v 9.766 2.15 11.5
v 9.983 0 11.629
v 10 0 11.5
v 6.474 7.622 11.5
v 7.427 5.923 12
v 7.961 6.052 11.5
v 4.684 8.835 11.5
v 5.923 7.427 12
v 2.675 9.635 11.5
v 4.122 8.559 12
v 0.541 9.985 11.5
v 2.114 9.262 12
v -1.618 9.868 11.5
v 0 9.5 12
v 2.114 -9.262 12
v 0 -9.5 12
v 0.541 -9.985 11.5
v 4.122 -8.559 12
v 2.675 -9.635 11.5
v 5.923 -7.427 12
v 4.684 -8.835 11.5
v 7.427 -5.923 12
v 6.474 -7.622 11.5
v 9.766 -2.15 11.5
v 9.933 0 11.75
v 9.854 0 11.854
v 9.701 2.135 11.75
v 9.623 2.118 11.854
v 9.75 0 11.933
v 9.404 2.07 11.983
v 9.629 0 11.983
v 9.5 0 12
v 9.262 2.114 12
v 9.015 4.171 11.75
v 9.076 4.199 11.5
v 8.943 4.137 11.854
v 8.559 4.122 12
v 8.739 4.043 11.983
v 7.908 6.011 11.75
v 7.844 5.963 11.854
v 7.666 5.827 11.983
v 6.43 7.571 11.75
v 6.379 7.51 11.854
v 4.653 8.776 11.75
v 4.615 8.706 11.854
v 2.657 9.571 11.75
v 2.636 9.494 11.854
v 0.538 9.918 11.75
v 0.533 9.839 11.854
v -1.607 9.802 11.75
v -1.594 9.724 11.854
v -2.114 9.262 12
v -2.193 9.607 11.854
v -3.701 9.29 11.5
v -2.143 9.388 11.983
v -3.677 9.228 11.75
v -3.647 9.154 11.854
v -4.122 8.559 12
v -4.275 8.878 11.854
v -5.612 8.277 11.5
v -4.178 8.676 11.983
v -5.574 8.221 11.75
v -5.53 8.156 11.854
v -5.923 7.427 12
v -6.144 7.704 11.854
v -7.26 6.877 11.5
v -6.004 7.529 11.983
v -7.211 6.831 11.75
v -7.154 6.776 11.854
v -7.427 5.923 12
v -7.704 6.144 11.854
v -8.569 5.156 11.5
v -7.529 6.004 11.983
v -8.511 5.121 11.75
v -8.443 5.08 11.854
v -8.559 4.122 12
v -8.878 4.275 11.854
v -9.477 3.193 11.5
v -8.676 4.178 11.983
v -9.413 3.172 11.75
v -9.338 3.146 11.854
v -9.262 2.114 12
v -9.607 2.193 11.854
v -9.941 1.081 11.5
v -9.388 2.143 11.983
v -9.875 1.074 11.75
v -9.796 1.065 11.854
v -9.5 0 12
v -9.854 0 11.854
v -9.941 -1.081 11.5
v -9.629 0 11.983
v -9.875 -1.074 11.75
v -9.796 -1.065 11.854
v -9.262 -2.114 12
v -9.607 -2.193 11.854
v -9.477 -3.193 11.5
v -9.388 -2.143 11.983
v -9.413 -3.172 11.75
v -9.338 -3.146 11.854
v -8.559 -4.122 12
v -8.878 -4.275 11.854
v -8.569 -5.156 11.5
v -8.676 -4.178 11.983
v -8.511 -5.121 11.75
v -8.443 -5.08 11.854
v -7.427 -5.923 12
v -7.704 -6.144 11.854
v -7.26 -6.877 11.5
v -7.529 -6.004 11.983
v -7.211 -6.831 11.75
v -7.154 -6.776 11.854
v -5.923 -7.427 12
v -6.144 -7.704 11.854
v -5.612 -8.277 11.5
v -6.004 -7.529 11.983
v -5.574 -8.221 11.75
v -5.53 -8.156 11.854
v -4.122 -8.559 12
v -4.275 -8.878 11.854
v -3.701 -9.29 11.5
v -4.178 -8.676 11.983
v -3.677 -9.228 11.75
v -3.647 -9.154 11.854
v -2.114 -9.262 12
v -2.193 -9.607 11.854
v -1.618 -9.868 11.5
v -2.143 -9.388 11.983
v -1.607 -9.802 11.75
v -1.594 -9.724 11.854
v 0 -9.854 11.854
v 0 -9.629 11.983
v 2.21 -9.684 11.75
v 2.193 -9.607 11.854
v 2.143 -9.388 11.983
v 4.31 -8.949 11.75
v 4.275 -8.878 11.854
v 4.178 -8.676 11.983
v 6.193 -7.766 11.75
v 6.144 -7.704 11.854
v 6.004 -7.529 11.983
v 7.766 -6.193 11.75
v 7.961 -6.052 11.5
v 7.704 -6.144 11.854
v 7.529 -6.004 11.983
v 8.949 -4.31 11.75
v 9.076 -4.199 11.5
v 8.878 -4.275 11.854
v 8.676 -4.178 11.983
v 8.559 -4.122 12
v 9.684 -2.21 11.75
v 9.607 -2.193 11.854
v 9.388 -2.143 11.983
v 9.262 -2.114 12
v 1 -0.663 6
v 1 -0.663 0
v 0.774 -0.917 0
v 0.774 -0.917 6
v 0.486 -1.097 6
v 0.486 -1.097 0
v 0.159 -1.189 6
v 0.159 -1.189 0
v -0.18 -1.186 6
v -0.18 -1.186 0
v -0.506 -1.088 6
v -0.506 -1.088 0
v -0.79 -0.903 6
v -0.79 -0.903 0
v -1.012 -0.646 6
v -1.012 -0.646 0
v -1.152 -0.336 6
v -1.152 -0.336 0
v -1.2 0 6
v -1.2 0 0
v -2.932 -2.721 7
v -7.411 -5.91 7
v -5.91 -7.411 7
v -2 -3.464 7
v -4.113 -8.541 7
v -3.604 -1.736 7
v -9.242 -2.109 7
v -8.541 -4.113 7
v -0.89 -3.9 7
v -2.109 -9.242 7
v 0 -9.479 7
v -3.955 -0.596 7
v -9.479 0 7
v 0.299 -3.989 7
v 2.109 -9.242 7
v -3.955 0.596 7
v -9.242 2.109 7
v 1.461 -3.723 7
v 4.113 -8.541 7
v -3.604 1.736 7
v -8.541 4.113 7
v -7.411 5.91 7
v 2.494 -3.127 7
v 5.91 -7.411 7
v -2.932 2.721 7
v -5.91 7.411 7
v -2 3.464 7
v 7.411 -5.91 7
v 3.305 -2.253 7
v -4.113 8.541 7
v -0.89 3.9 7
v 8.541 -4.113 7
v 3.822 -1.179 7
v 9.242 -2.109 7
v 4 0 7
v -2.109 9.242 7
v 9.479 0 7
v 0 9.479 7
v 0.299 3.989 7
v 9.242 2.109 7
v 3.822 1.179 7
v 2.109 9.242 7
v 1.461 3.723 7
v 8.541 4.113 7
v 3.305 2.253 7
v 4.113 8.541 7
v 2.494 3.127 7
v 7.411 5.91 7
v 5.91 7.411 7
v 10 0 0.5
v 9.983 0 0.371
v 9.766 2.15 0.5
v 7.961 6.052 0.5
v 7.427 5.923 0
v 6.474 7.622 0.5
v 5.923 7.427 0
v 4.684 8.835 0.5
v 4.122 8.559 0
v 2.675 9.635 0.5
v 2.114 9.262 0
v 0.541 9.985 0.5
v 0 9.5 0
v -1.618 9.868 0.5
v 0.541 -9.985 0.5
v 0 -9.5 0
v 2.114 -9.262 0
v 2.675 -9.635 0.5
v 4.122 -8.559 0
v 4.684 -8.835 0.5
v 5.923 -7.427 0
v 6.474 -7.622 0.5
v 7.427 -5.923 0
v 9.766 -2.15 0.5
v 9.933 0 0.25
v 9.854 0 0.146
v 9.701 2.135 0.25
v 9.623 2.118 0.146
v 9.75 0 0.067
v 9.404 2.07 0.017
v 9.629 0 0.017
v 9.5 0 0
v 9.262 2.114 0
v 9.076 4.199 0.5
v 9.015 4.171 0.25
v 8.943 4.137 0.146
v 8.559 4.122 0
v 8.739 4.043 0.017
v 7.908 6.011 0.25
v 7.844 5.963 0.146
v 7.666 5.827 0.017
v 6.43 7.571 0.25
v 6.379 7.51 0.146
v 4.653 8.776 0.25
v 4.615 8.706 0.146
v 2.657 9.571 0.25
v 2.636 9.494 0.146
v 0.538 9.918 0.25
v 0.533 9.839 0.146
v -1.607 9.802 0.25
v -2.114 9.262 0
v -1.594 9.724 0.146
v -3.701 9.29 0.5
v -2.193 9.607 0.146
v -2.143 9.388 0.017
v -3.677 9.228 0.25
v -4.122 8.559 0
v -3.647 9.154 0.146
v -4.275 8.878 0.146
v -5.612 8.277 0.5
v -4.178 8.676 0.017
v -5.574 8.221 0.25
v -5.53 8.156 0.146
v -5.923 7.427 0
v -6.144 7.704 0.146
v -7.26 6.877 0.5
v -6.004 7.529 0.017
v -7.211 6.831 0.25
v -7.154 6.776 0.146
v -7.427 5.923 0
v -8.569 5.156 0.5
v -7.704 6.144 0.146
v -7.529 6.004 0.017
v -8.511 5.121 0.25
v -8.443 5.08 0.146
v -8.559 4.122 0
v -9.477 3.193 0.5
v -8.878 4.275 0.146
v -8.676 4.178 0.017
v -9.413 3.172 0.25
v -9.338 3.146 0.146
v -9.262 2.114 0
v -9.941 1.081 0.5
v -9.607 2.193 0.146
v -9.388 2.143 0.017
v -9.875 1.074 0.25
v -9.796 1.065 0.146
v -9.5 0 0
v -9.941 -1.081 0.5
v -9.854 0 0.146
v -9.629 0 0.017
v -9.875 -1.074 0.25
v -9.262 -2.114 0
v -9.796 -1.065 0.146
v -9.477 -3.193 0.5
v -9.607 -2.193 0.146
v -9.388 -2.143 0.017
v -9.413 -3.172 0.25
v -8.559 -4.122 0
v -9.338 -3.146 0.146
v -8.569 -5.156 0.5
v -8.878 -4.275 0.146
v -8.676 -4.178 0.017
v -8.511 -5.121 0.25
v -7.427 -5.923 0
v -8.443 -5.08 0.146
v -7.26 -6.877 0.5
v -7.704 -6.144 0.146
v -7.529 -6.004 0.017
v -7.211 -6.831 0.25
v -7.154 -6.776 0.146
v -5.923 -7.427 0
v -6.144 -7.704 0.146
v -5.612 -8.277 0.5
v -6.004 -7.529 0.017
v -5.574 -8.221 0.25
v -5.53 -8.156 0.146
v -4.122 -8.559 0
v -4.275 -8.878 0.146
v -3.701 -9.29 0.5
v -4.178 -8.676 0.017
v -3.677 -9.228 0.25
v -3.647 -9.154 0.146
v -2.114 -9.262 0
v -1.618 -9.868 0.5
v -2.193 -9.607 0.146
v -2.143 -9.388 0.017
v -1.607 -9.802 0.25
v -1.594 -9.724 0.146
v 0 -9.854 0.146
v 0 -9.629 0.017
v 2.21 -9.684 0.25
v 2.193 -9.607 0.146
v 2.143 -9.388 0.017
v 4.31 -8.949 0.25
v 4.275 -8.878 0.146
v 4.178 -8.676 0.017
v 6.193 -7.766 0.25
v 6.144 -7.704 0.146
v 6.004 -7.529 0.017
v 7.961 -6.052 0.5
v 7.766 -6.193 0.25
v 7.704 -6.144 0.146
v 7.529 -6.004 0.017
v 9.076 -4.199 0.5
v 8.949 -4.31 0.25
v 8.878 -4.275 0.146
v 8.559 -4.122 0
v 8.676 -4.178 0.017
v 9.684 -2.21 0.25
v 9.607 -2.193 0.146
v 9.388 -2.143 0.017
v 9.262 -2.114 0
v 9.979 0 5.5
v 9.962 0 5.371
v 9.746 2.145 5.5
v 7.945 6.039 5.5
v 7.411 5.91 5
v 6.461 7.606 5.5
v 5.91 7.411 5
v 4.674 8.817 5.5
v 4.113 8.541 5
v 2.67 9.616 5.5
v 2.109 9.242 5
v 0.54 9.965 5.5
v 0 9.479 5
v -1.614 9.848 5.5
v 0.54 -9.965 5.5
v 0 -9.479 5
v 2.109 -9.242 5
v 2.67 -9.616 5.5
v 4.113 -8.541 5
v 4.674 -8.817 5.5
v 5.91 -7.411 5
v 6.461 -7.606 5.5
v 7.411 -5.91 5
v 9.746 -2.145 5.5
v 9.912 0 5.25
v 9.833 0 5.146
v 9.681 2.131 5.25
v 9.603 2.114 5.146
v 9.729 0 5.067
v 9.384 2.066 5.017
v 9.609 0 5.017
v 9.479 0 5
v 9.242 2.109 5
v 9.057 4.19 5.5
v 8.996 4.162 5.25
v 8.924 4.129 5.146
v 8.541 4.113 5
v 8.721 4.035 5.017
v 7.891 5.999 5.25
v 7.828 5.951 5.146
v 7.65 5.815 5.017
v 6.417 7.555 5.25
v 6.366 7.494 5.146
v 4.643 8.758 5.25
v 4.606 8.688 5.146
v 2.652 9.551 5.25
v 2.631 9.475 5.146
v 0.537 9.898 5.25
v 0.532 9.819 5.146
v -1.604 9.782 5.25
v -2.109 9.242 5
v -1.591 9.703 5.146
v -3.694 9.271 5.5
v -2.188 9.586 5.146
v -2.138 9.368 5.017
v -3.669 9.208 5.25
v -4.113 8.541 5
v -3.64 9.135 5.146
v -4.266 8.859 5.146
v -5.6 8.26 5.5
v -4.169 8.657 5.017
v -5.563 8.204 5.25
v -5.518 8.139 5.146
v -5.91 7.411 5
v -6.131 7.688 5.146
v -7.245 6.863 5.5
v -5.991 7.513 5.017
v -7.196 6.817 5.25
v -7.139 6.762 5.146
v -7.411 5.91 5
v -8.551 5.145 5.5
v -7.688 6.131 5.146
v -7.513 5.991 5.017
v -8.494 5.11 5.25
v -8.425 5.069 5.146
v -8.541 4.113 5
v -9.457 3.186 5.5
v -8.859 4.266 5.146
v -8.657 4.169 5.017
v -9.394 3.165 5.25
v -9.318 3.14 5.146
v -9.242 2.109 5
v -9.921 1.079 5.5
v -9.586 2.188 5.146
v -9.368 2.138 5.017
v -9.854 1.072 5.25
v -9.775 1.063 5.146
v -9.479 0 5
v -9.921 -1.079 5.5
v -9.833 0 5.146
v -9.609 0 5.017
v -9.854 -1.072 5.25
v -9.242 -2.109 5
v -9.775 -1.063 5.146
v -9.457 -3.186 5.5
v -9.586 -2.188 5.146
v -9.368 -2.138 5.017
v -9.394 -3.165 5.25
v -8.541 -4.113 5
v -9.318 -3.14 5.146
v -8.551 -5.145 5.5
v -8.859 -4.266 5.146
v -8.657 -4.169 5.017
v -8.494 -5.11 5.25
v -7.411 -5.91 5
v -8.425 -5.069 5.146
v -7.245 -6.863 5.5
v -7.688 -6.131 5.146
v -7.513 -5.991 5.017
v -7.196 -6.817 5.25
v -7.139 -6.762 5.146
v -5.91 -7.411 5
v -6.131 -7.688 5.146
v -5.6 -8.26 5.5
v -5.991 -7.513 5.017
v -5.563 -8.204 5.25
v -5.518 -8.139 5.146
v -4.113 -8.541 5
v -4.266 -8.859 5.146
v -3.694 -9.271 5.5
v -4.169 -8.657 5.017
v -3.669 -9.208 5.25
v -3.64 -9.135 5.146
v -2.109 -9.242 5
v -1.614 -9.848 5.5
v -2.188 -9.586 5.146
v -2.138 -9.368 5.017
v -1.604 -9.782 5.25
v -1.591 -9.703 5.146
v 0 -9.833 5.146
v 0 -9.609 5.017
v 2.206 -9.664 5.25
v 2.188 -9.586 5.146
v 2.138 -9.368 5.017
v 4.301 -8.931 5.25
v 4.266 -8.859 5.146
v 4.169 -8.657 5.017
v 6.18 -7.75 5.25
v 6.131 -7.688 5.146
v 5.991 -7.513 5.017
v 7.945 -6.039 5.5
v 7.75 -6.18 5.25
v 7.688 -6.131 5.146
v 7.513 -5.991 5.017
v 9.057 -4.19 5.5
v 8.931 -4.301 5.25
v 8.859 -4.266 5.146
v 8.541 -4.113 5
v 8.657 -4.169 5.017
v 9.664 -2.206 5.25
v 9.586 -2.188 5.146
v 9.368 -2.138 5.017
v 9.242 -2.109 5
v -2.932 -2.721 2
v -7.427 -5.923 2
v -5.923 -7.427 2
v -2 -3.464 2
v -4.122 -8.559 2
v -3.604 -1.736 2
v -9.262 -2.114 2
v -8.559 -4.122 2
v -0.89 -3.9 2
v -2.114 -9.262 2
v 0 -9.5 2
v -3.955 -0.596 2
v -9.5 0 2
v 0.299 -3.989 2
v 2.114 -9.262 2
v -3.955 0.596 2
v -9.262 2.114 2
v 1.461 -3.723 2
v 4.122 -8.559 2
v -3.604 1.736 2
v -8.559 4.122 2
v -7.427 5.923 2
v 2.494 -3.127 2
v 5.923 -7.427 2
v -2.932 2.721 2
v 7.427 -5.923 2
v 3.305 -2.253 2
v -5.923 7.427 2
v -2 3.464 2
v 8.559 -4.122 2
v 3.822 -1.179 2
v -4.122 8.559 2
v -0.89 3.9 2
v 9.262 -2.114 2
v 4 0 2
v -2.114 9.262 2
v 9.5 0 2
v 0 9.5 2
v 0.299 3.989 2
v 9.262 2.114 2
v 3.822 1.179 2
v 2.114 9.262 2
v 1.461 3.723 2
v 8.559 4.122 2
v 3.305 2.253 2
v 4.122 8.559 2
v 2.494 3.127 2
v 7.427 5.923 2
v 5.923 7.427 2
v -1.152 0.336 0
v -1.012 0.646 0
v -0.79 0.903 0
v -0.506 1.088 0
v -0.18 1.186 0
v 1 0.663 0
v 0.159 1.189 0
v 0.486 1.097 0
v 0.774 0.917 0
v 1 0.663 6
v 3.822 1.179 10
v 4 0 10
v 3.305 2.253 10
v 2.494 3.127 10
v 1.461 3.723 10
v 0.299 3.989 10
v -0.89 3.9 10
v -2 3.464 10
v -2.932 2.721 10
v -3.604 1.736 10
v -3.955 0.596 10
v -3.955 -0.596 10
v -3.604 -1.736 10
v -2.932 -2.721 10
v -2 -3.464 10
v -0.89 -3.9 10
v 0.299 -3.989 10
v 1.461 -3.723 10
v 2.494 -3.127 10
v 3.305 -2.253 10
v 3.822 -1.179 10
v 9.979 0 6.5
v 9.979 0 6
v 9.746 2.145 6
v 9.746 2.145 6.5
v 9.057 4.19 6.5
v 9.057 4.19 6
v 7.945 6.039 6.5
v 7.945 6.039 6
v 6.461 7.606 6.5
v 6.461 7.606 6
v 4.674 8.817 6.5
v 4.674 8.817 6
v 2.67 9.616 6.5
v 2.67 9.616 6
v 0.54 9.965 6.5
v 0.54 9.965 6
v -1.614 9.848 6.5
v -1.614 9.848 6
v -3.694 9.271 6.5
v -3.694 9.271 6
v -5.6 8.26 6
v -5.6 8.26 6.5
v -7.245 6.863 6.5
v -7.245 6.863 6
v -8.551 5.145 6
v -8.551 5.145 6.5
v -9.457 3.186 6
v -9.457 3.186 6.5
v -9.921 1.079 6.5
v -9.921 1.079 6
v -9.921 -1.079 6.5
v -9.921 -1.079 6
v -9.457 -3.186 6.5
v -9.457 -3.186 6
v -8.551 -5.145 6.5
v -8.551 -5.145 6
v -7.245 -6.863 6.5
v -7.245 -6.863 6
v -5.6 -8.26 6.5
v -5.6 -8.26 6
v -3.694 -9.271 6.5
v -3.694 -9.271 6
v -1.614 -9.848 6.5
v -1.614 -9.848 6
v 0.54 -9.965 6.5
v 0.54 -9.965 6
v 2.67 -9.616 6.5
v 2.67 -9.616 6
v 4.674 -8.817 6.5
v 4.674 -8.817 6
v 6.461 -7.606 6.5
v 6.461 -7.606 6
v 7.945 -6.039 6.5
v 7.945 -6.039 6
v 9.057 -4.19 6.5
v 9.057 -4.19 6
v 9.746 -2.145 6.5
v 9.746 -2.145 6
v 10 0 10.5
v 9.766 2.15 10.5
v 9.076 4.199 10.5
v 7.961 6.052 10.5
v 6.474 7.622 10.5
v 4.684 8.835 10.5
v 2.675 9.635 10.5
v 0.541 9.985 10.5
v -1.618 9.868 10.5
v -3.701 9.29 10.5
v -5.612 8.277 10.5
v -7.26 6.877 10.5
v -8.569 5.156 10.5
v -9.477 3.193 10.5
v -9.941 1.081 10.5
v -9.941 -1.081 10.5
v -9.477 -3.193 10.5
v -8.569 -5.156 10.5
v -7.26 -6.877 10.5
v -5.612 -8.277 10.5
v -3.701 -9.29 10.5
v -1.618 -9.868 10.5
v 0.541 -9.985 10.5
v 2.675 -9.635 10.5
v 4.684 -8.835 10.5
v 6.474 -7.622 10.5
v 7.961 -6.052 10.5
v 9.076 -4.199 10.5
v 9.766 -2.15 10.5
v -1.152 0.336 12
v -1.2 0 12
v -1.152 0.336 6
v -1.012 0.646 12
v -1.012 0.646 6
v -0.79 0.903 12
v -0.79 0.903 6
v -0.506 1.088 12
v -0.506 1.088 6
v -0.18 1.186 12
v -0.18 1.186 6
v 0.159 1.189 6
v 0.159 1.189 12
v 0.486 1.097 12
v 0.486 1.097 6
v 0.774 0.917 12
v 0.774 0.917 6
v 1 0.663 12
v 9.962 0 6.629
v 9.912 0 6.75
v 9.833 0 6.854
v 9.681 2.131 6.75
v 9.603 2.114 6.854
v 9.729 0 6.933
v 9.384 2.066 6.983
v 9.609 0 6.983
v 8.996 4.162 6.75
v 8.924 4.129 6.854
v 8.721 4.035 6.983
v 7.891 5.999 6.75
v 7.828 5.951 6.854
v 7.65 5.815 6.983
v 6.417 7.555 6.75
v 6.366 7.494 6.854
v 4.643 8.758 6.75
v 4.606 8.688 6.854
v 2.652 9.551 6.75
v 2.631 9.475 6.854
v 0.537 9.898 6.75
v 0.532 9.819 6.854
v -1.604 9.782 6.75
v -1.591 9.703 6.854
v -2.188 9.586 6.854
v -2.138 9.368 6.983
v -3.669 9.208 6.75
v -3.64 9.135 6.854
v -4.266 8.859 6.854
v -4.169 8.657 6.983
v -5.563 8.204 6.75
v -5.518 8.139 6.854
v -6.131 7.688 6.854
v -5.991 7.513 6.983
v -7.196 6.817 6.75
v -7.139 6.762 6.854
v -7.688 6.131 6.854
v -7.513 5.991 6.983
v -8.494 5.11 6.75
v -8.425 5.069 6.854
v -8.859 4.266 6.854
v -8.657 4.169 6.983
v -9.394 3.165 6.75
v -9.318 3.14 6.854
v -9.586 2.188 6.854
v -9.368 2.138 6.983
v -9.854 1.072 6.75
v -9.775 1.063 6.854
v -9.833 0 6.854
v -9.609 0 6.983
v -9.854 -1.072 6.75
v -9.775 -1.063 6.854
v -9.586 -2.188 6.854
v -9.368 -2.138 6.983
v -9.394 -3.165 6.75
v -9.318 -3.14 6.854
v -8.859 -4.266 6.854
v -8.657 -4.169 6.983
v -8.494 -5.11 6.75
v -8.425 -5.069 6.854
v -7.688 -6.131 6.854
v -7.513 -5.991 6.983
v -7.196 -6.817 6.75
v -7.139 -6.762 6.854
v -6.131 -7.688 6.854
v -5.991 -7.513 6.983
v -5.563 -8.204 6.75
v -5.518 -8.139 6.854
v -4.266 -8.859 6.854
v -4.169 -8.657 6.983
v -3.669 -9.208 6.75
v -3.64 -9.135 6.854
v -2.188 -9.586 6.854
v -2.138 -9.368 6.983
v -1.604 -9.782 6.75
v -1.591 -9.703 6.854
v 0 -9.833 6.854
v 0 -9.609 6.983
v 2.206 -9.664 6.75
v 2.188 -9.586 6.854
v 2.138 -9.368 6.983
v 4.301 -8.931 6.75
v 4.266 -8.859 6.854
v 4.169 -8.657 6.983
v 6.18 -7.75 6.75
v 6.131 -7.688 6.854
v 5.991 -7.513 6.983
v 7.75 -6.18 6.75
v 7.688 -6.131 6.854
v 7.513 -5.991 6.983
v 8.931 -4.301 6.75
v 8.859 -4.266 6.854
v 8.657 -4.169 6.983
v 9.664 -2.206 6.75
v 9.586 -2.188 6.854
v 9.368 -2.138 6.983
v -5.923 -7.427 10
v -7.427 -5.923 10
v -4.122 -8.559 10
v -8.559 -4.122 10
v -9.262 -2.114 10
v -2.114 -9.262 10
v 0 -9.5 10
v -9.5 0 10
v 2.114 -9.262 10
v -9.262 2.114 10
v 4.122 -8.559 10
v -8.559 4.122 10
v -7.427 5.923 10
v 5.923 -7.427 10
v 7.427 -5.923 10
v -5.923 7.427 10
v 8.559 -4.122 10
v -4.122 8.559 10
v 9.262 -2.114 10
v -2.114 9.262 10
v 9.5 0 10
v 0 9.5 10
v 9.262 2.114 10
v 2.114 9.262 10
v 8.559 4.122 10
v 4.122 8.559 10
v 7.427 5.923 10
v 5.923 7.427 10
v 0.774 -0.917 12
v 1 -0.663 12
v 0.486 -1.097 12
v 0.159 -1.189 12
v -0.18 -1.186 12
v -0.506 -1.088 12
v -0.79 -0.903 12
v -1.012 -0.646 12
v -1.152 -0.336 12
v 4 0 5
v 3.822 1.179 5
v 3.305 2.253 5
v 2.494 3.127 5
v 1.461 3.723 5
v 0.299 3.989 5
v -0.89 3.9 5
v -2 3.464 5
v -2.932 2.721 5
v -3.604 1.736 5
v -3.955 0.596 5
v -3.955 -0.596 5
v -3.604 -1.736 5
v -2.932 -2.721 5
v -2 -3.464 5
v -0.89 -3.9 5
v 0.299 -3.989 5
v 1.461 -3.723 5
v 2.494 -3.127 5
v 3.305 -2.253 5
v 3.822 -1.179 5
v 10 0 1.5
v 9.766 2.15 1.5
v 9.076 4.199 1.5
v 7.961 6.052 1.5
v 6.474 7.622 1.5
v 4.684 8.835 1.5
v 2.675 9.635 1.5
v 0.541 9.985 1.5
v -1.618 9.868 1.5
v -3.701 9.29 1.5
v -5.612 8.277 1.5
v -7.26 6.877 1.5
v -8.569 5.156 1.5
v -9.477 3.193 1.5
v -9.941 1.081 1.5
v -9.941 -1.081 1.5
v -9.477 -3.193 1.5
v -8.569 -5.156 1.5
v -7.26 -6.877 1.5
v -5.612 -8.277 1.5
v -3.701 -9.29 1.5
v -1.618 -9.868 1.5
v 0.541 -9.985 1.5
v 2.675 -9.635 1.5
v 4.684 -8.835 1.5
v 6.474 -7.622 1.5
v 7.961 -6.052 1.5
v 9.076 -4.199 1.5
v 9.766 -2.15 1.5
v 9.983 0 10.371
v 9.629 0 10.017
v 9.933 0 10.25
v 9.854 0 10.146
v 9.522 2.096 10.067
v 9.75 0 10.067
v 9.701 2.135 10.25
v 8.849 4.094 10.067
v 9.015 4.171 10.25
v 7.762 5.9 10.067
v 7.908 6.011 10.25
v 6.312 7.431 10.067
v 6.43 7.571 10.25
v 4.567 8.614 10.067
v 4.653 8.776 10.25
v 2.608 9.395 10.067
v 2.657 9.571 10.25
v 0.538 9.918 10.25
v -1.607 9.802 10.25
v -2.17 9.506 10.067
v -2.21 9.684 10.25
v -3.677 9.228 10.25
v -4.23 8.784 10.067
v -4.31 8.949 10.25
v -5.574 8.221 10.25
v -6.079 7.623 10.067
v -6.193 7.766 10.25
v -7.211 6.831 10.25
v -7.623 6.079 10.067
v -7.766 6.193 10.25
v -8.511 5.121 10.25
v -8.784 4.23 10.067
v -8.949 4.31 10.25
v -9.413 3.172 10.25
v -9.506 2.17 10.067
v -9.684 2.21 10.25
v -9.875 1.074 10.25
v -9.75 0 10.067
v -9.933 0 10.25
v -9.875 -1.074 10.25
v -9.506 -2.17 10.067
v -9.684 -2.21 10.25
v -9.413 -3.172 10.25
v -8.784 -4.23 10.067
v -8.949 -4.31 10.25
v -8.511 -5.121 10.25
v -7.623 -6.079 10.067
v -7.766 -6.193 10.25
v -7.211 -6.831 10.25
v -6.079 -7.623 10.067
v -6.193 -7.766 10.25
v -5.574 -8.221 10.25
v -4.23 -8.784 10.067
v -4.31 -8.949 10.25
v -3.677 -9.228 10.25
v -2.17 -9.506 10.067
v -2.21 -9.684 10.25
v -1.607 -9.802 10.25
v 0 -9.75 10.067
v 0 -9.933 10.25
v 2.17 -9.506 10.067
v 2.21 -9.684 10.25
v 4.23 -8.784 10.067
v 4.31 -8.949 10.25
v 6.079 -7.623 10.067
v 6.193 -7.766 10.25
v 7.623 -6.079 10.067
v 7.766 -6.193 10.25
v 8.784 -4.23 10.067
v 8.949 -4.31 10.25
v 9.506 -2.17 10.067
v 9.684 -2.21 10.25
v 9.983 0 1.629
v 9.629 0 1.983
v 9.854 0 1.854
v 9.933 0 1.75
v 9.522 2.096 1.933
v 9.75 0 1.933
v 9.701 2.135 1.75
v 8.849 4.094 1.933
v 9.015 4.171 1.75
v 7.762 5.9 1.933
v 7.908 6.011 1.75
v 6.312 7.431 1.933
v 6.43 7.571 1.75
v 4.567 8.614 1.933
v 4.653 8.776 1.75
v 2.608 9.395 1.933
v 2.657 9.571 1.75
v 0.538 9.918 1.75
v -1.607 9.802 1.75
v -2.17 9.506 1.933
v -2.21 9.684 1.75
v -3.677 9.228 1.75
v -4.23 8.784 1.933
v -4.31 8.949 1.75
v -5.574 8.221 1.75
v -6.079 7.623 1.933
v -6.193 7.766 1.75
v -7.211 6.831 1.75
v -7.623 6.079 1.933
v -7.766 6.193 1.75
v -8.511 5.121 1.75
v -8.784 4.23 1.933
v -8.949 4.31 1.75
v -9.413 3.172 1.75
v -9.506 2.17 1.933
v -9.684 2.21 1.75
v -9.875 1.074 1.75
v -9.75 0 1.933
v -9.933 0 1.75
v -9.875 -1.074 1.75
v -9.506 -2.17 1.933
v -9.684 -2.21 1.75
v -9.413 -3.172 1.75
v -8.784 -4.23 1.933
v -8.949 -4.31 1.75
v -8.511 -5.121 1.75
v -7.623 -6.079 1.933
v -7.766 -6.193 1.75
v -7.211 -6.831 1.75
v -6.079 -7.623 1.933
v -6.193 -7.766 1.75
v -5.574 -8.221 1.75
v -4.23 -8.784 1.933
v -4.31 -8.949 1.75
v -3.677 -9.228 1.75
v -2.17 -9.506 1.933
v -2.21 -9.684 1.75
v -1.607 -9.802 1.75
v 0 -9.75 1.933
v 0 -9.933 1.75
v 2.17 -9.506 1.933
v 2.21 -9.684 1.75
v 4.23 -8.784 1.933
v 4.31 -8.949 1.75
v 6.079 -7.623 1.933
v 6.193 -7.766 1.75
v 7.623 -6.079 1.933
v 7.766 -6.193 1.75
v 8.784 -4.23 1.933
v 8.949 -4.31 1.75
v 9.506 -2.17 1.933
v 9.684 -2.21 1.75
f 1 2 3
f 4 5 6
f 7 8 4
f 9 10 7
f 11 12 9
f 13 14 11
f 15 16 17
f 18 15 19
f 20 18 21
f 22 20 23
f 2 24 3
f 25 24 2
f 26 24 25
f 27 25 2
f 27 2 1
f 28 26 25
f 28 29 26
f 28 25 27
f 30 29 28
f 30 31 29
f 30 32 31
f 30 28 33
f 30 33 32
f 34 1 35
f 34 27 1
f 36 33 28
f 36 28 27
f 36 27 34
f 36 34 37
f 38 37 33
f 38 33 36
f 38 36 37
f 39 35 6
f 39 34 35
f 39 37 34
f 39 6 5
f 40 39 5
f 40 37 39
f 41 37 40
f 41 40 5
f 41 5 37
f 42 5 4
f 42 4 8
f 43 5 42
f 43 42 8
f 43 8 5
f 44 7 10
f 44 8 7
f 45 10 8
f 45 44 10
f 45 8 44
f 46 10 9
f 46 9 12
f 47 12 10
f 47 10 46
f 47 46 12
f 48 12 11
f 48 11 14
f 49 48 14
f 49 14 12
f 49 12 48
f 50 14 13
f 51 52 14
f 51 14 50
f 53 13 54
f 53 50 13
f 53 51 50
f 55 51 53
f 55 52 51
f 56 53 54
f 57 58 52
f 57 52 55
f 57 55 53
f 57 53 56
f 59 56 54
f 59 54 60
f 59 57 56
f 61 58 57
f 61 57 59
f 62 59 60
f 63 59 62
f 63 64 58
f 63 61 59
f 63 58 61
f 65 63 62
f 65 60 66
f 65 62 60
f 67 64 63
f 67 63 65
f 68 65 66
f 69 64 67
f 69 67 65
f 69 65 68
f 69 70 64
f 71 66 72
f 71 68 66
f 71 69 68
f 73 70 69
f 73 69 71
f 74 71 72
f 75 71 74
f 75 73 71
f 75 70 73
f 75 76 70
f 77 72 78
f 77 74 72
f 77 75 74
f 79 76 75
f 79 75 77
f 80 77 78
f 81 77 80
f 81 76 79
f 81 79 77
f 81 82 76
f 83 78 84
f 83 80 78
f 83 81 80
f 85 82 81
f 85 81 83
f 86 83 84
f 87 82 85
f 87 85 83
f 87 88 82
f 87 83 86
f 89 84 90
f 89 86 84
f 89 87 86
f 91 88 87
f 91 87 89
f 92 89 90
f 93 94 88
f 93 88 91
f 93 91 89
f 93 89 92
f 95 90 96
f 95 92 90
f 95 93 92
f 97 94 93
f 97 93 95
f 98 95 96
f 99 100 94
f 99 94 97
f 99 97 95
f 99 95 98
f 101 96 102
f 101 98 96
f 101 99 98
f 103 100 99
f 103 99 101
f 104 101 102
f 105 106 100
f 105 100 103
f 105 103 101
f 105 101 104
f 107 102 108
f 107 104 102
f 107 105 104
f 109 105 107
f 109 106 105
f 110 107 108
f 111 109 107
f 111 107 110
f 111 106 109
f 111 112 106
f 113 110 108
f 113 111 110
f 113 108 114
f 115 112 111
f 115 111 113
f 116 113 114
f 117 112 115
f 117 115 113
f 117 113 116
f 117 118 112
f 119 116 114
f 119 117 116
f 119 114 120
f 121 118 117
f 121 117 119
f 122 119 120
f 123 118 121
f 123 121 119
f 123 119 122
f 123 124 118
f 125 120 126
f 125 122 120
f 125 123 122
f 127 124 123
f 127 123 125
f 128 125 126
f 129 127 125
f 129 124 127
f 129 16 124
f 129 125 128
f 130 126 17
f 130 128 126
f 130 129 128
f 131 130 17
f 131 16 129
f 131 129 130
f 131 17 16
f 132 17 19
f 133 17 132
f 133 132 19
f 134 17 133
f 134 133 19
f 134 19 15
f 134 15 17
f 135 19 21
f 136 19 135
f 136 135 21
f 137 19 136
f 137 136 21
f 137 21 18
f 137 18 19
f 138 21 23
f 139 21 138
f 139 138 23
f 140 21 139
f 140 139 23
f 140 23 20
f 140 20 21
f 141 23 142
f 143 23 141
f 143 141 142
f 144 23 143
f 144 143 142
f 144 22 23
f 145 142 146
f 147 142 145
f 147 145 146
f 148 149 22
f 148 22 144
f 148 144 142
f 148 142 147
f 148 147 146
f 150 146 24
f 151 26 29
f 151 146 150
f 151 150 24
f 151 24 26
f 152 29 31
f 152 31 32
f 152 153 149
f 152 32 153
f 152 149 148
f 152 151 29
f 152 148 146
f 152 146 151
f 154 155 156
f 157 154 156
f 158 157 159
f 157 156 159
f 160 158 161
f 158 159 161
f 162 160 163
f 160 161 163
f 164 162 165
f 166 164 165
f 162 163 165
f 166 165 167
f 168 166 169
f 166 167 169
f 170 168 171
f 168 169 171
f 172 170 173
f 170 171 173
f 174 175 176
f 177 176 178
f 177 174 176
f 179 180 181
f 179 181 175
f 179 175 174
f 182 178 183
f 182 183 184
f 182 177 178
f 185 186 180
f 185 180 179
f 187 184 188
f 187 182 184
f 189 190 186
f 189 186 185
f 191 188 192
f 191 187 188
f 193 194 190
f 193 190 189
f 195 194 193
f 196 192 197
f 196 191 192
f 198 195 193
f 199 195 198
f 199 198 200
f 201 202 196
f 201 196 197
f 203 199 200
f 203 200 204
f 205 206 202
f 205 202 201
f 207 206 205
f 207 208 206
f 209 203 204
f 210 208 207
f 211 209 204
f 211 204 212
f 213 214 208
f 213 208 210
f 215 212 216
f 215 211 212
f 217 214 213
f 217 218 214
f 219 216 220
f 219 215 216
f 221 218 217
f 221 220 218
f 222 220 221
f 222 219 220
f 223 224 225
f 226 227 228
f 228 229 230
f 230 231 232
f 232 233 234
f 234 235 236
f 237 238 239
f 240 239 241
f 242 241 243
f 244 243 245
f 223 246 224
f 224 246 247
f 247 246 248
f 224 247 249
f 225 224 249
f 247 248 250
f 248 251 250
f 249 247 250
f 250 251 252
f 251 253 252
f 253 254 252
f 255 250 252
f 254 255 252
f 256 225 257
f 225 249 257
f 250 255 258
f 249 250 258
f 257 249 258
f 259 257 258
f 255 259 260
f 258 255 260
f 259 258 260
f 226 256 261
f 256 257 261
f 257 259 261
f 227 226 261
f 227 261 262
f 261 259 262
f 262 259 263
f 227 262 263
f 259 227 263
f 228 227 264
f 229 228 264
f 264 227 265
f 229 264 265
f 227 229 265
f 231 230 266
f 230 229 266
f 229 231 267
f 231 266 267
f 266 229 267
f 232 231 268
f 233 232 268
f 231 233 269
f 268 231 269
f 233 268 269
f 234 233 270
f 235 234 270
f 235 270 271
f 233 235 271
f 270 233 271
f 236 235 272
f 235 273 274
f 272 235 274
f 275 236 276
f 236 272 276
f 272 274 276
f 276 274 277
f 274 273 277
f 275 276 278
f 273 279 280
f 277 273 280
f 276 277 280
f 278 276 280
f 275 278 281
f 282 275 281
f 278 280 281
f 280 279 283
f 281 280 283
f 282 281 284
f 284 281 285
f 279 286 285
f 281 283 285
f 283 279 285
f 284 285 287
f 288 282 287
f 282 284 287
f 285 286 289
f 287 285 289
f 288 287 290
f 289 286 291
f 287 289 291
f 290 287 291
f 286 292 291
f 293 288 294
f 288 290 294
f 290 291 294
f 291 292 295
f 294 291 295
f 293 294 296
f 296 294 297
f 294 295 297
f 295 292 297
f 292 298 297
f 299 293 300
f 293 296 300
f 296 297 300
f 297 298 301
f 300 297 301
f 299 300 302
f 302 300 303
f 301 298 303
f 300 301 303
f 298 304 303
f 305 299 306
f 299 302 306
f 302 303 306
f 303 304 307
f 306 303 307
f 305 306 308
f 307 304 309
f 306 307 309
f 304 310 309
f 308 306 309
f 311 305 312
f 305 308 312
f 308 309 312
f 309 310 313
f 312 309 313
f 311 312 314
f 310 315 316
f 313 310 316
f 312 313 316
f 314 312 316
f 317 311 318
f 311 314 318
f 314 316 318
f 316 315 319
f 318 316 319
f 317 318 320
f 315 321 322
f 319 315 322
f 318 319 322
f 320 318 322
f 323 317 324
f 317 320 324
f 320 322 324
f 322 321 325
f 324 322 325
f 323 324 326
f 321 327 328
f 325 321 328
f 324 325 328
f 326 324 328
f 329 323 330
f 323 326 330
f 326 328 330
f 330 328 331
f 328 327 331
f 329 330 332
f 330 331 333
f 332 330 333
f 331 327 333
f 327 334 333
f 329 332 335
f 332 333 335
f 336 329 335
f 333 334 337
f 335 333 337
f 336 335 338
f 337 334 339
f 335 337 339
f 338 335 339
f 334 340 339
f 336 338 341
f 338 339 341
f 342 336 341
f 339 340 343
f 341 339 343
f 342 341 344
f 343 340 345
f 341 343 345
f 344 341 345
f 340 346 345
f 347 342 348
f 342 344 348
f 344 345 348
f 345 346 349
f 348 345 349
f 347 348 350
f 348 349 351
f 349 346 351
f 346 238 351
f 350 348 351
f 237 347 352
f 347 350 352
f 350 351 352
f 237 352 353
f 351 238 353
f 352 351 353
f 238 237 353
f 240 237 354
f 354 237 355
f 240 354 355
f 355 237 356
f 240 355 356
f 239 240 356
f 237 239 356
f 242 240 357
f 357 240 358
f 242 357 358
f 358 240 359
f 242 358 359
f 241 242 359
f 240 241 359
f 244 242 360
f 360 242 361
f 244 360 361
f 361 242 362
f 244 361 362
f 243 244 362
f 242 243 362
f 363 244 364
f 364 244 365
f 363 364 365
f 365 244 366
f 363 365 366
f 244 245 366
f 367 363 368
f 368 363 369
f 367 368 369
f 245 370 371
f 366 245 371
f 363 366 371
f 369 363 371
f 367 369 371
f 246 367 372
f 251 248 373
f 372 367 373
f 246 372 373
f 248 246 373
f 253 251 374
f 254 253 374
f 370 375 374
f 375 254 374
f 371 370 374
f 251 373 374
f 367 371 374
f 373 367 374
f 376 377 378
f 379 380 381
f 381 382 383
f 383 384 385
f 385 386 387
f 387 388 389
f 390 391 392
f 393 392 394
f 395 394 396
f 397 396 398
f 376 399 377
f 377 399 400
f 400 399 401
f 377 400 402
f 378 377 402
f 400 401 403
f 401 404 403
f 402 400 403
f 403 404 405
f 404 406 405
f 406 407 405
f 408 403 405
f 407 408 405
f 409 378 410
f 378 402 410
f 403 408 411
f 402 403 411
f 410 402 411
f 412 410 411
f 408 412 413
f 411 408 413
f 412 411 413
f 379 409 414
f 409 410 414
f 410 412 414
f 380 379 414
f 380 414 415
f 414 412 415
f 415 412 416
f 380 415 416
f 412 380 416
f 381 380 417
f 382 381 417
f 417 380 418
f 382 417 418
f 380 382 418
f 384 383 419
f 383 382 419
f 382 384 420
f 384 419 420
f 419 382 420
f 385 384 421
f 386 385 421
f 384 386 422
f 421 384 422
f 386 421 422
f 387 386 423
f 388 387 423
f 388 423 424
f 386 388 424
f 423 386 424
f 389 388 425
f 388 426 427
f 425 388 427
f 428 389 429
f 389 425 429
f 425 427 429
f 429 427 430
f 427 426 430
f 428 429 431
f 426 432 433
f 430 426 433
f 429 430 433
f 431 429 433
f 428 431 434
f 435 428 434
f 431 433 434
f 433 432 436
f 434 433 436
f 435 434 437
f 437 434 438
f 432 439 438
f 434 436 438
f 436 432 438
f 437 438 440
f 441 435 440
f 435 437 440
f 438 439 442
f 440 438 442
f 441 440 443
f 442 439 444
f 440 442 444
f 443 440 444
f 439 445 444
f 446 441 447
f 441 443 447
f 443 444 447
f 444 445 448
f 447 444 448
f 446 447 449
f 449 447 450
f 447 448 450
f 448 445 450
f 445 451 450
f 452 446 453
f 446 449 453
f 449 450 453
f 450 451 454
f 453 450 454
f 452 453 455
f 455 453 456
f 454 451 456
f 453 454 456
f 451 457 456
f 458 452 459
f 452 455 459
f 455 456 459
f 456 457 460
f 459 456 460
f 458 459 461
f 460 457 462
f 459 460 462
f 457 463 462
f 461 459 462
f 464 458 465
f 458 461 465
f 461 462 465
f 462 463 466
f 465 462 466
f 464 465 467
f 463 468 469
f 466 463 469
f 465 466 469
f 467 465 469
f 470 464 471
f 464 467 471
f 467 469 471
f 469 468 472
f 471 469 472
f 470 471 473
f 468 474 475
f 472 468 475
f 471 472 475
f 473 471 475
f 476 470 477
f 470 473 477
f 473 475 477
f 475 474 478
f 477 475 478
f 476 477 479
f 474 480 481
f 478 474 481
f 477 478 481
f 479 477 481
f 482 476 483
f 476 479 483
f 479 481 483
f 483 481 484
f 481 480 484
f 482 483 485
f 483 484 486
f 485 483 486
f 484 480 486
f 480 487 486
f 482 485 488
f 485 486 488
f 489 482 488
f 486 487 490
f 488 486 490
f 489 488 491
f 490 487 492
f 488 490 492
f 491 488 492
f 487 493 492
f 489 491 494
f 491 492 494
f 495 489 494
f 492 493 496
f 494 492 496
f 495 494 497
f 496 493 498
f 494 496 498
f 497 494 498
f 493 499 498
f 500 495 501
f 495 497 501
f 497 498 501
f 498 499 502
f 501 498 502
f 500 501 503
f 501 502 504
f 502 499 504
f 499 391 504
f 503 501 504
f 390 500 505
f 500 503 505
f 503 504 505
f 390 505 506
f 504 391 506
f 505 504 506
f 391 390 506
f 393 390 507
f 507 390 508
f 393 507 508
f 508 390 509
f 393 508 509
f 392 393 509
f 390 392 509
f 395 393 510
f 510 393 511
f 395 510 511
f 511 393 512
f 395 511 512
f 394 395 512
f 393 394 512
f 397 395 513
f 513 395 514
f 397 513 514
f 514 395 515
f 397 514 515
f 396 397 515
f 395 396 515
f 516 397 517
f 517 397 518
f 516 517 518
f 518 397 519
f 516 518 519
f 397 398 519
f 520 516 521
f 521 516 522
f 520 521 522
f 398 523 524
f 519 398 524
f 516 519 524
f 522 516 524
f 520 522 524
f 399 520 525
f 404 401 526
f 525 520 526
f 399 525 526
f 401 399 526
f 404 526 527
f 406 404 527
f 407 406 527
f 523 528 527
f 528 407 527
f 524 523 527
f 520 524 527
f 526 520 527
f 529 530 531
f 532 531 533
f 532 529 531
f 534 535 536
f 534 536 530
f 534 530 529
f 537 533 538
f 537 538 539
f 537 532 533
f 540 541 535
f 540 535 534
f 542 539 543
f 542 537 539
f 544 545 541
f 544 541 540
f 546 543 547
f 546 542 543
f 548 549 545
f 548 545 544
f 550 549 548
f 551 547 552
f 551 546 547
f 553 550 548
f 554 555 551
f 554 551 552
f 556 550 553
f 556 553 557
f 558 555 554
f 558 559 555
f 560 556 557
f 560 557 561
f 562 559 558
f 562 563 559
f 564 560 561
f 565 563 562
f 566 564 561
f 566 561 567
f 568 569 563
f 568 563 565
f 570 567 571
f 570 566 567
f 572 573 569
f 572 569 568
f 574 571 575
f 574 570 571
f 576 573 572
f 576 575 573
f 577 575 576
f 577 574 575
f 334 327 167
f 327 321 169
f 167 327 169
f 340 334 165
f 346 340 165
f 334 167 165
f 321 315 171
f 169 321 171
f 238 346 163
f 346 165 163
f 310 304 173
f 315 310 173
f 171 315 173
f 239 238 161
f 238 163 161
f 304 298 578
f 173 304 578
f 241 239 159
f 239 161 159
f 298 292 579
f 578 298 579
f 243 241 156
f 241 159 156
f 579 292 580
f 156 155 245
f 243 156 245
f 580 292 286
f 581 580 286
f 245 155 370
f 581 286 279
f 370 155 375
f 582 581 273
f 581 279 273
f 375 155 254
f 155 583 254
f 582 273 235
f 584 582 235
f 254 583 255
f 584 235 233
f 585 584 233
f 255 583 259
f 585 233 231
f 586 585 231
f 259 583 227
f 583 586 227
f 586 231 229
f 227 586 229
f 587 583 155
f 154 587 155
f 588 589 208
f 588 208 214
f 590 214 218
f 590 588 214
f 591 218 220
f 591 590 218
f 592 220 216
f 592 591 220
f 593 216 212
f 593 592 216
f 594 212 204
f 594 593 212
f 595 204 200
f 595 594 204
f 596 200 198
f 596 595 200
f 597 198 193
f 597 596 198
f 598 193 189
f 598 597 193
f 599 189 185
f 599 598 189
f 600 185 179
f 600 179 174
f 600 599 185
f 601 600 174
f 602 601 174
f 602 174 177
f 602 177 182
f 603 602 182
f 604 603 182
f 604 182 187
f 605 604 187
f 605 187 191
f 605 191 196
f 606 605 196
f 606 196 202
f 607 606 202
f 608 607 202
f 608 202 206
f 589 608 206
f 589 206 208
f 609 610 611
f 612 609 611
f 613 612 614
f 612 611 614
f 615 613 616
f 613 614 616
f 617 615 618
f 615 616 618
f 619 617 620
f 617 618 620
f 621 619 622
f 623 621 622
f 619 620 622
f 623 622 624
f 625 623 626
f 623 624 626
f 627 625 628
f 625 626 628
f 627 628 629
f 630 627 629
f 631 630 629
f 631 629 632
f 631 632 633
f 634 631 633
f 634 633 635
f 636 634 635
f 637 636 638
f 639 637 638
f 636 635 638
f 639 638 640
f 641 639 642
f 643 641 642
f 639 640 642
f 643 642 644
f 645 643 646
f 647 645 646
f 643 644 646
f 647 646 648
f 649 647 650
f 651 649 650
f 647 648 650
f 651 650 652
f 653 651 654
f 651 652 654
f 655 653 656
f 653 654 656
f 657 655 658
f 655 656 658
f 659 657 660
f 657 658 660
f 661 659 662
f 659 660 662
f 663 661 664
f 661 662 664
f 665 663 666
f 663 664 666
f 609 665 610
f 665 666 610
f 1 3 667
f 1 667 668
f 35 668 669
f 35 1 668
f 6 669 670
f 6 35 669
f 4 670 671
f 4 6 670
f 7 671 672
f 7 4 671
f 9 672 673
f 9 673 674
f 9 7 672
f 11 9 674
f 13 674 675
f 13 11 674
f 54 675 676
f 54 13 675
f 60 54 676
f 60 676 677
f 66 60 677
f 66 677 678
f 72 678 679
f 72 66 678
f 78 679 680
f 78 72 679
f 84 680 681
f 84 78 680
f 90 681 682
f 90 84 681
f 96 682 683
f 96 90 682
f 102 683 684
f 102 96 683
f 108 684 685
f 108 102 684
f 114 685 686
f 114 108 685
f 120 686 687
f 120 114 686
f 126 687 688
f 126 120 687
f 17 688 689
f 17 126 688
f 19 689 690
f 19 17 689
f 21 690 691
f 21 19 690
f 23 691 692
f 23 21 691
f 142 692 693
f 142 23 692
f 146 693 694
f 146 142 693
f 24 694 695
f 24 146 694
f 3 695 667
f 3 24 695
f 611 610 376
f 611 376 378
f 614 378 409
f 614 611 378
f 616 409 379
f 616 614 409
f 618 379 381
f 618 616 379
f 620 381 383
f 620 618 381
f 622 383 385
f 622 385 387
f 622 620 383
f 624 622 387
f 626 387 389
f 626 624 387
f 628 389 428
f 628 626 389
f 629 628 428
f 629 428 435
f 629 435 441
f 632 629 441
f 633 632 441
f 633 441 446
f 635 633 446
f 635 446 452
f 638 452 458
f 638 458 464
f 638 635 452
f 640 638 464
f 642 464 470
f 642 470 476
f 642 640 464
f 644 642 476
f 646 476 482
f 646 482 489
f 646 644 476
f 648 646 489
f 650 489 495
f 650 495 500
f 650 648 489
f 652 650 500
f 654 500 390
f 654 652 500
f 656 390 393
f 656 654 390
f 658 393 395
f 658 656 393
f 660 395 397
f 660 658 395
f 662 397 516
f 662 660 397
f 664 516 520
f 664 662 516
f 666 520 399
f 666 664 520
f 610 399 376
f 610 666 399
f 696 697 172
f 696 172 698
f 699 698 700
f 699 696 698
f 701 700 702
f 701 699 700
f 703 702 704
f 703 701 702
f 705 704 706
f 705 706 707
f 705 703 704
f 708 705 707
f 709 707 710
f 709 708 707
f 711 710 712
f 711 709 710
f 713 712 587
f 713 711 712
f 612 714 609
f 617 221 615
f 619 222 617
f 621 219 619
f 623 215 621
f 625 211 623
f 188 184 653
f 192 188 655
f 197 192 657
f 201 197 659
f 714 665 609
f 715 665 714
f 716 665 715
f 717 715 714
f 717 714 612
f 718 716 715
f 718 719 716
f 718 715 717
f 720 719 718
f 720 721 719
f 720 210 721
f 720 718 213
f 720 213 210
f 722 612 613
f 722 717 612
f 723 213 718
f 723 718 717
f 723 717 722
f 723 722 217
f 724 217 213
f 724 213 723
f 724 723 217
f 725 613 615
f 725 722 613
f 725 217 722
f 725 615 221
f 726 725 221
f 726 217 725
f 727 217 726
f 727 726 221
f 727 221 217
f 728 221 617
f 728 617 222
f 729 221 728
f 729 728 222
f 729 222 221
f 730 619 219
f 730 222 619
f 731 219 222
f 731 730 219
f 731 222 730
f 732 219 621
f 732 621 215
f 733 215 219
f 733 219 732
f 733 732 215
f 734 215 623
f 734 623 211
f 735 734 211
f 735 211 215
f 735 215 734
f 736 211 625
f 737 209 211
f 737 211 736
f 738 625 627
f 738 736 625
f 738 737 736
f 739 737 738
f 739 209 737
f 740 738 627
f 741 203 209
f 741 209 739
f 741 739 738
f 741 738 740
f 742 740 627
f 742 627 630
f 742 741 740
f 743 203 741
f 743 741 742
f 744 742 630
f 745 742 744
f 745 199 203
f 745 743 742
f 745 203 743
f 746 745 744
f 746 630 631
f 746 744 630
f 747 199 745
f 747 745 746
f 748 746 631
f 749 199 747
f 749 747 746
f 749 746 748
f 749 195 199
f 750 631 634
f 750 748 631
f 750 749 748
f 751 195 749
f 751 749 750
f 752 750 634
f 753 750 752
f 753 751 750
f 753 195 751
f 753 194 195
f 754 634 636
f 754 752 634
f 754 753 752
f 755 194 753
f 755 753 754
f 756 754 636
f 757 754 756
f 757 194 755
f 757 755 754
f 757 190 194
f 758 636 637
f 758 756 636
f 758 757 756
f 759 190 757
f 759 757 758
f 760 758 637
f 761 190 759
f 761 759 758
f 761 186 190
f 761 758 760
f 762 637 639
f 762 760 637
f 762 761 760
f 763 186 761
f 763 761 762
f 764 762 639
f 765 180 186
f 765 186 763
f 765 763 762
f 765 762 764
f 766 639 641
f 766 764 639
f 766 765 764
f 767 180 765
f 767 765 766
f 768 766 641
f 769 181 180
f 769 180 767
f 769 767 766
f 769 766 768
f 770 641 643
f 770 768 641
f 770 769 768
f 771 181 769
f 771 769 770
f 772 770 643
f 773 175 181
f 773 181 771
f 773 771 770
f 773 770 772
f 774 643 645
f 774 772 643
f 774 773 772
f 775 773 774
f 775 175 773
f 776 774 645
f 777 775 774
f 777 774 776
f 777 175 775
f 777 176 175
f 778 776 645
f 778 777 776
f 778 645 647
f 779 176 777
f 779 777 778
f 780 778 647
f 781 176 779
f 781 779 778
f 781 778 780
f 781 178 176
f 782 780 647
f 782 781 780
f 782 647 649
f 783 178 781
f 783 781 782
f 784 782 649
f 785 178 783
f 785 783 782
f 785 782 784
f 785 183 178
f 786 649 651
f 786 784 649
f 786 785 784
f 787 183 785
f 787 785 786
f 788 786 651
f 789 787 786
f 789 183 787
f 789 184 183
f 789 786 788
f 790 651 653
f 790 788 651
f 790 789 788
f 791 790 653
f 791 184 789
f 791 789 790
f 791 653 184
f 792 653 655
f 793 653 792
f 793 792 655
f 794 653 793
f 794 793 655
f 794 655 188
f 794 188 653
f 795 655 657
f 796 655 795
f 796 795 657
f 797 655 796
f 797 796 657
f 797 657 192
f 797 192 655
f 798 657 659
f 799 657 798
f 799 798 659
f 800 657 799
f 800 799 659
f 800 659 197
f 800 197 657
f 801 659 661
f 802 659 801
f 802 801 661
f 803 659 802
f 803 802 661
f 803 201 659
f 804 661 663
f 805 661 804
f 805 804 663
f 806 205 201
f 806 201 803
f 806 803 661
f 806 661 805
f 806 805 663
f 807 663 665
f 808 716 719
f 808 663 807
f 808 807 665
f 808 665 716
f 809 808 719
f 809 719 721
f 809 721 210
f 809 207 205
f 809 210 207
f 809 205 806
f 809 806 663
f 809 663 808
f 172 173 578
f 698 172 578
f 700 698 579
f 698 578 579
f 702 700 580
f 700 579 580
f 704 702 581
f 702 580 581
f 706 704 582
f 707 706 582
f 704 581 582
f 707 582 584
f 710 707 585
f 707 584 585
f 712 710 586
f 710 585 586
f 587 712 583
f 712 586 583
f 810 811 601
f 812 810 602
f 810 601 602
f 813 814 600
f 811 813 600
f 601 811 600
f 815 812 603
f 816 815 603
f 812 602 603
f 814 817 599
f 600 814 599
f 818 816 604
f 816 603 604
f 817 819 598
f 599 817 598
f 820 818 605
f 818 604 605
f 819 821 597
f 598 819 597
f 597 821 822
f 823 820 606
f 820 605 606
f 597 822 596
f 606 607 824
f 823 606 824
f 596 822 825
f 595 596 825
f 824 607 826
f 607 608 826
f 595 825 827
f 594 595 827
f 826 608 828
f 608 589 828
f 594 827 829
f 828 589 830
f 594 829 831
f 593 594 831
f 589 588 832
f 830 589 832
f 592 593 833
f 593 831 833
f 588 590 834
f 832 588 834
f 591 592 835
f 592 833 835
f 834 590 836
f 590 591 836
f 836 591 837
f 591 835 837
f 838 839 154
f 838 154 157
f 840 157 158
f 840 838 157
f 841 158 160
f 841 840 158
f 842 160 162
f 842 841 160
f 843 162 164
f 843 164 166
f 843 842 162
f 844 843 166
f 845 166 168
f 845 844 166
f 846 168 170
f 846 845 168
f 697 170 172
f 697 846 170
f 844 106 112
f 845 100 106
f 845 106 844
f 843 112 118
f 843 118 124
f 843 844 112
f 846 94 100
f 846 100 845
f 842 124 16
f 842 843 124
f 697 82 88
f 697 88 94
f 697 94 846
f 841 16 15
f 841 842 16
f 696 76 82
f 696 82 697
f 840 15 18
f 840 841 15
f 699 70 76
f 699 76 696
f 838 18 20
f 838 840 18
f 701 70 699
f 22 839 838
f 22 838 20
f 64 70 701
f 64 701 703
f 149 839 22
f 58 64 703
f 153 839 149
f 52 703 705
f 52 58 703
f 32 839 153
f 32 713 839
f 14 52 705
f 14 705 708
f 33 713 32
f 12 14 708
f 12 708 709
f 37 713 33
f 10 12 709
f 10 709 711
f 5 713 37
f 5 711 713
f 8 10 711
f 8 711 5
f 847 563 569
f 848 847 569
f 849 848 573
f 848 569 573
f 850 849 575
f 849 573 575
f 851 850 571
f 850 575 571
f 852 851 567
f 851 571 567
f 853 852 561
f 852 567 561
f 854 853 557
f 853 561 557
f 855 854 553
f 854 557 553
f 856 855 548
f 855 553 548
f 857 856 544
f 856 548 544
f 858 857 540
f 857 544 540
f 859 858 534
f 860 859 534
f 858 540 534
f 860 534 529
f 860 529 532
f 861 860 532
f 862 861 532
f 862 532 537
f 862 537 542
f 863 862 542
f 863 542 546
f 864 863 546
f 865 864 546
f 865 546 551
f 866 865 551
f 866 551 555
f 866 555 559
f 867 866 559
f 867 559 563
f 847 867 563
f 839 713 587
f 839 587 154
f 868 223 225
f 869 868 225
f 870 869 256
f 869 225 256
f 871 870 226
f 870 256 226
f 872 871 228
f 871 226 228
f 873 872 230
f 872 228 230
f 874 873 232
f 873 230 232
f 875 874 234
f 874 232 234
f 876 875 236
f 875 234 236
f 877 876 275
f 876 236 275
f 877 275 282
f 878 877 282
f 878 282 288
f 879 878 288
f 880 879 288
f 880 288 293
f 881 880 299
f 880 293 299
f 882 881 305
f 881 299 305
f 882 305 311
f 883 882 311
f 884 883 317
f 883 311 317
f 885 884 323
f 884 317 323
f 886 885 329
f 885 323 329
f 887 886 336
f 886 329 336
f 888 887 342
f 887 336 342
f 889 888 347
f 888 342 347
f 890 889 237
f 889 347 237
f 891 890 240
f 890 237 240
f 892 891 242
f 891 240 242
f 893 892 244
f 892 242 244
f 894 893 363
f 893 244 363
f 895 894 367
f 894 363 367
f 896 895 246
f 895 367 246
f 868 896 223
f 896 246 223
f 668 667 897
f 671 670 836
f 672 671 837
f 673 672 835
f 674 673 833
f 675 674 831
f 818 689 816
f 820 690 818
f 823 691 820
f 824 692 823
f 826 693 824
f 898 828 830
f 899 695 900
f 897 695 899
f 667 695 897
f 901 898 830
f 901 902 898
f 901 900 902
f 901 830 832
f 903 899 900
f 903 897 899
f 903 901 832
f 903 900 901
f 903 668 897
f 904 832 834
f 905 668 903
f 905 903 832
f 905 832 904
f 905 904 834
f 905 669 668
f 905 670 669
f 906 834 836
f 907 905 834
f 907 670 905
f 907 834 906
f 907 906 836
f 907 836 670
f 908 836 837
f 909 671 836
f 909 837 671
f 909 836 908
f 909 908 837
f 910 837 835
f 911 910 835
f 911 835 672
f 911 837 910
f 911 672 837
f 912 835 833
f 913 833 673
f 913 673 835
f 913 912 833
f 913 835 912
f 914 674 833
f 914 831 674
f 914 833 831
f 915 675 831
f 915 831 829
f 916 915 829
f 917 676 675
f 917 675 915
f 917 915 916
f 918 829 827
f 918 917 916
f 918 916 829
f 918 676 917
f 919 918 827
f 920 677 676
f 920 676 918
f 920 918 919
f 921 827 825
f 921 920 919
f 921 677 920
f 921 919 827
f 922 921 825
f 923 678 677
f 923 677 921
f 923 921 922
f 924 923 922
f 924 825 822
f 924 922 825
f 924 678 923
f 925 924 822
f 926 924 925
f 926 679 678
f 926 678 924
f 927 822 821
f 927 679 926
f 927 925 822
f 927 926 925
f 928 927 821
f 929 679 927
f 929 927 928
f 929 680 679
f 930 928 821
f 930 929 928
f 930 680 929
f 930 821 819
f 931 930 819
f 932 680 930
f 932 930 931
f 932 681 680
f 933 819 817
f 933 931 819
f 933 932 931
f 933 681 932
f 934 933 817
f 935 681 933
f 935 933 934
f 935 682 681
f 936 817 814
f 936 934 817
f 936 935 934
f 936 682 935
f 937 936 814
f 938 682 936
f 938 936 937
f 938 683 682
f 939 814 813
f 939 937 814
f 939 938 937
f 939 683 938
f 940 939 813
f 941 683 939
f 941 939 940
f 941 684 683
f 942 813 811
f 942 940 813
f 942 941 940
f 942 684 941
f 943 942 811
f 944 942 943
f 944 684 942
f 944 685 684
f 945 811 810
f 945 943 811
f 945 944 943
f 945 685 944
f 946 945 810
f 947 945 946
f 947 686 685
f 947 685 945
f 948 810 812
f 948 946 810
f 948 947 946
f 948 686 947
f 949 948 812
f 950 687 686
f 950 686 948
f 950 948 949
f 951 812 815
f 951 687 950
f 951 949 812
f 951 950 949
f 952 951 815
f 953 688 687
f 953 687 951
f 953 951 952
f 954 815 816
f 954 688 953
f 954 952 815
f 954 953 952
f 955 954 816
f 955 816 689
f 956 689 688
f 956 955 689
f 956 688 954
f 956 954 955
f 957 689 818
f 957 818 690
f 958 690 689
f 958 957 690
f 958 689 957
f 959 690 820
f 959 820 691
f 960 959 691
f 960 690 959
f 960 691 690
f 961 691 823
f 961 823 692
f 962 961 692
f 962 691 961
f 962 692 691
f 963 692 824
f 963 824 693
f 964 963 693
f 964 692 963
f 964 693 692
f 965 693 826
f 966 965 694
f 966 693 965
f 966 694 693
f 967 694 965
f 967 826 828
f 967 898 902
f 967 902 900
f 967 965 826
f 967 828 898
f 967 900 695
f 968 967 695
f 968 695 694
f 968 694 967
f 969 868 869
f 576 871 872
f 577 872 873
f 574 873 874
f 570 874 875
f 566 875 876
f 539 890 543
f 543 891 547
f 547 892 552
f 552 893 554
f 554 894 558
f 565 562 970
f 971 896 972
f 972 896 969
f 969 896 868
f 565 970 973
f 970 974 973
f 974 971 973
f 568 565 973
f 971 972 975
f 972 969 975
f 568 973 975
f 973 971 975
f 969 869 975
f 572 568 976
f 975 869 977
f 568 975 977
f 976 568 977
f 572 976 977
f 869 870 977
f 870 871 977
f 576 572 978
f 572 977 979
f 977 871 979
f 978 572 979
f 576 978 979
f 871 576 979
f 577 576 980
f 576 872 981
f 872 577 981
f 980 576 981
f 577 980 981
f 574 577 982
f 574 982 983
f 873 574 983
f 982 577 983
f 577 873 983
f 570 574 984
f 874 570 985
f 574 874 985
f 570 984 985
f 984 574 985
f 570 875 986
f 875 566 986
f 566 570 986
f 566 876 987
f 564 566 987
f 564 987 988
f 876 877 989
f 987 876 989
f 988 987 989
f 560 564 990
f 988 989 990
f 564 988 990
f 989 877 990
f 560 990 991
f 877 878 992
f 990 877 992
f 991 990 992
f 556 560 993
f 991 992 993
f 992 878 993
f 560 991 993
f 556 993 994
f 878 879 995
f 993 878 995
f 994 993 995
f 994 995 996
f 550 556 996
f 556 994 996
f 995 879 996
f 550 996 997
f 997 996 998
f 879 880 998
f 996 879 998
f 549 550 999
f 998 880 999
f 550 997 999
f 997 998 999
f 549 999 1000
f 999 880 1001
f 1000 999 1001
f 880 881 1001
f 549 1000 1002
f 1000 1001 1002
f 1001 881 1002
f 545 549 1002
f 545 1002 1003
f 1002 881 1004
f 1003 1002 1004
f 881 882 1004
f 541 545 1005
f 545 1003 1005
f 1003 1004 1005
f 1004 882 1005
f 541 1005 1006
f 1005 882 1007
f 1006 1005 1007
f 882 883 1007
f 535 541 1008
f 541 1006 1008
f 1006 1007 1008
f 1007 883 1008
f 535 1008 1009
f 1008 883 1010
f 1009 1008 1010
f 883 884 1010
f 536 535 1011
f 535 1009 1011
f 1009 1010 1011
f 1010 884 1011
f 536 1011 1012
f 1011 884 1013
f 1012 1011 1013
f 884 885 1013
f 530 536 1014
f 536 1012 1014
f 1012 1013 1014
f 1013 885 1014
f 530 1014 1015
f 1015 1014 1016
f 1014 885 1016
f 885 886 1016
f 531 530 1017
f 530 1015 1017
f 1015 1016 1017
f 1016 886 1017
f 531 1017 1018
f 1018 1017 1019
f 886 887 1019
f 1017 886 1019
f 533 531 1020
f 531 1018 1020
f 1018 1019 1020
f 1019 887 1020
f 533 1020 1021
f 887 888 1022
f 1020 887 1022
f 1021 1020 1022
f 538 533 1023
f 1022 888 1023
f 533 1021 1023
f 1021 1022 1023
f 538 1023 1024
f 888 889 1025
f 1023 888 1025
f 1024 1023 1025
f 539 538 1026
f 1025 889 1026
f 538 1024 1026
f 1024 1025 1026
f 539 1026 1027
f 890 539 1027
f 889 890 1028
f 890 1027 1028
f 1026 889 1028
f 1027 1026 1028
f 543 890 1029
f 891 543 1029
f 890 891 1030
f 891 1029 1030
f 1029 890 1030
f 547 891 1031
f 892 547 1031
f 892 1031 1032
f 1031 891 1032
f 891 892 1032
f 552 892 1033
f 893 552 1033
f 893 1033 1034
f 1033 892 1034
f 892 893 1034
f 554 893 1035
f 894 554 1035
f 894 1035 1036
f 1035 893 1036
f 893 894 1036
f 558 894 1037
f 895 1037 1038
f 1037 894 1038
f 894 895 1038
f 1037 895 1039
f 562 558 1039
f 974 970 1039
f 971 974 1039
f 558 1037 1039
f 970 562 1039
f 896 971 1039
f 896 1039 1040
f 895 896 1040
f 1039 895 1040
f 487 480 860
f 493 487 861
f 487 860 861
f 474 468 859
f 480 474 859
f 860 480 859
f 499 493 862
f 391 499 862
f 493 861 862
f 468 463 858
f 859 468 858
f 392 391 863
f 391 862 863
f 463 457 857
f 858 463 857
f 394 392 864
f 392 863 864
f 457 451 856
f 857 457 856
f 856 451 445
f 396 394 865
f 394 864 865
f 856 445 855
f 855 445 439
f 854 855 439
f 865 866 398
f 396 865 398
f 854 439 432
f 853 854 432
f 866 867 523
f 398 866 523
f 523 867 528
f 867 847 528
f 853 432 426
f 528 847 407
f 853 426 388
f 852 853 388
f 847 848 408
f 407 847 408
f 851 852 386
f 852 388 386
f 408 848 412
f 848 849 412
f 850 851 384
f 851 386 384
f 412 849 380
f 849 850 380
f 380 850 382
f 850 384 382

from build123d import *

# Parameters (mm, degrees)
F0_R     = 10
F0_R_2   = 4
F1_DEPTH = 2
F2_DEPTH = 6
F3_R     = 9.9794719686
F3_R_2   = 4
F4_DEPTH = 1
F7_R     = 0.5


with BuildPart() as f1:
    # F0 (on Top) → F1 (new body)
    with BuildSketch(Plane.XY):
        Circle(F0_R)
        Circle(F0_R_2, mode=Mode.SUBTRACT)
    extrude(amount=F1_DEPTH)

    # F0 (on Top) → F2 (join)
    with BuildSketch(Plane.XY):
        Circle(F0_R_2)
        with BuildLine():
            ThreePointArc((1, 0.6633249581), (1.1489125293, 0.3464101615), (1.2, 0))
            ThreePointArc((1.2, 0), (1.1489125293, -0.3464101615), (1, -0.6633249581))
            ThreePointArc((1, -0.6633249581), (-0.3464101615, -1.1489125293), (-1.2, 0))
            ThreePointArc((-1.2, 0), (-0.3464101615, 1.1489125293), (1, 0.6633249581))
        make_face(mode=Mode.SUBTRACT)
        with BuildLine():
            ThreePointArc((1, -0.6633249581), (1.1489125293, -0.3464101615), (1.2, 0))
            ThreePointArc((1.2, 0), (1.1489125293, 0.3464101615), (1, 0.6633249581))
            Line((1, 0.6633249581), (1, 0))
            Line((1, 0), (1, -0.6633249581))
        make_face()
    extrude(amount=F2_DEPTH)

    # F3 (on face) → F4 (join)
    with BuildSketch(Plane.XY.offset(6)):
        Circle(F3_R)
        Circle(F3_R_2, mode=Mode.SUBTRACT)
    extrude(amount=-F4_DEPTH)

    # F6: F1 across plane


with BuildPart() as f1_1:
    add(f1.part)
    add(f1.part.mirror(Plane.XY.offset(6)))

    # F7
    f7_edges = [f1_1.edges().sort_by_distance(p)[0] for p in [
        (-9.979472, 0, 7),
        (-9.979472, 0, 5),
        (-10, 0, 10),
        (-10, 0, 2),
        (-10, 0, 12),
        (-10, 0, 0),
    ]]
    fillet(f7_edges, radius=F7_R)


solid = f1_1.part
